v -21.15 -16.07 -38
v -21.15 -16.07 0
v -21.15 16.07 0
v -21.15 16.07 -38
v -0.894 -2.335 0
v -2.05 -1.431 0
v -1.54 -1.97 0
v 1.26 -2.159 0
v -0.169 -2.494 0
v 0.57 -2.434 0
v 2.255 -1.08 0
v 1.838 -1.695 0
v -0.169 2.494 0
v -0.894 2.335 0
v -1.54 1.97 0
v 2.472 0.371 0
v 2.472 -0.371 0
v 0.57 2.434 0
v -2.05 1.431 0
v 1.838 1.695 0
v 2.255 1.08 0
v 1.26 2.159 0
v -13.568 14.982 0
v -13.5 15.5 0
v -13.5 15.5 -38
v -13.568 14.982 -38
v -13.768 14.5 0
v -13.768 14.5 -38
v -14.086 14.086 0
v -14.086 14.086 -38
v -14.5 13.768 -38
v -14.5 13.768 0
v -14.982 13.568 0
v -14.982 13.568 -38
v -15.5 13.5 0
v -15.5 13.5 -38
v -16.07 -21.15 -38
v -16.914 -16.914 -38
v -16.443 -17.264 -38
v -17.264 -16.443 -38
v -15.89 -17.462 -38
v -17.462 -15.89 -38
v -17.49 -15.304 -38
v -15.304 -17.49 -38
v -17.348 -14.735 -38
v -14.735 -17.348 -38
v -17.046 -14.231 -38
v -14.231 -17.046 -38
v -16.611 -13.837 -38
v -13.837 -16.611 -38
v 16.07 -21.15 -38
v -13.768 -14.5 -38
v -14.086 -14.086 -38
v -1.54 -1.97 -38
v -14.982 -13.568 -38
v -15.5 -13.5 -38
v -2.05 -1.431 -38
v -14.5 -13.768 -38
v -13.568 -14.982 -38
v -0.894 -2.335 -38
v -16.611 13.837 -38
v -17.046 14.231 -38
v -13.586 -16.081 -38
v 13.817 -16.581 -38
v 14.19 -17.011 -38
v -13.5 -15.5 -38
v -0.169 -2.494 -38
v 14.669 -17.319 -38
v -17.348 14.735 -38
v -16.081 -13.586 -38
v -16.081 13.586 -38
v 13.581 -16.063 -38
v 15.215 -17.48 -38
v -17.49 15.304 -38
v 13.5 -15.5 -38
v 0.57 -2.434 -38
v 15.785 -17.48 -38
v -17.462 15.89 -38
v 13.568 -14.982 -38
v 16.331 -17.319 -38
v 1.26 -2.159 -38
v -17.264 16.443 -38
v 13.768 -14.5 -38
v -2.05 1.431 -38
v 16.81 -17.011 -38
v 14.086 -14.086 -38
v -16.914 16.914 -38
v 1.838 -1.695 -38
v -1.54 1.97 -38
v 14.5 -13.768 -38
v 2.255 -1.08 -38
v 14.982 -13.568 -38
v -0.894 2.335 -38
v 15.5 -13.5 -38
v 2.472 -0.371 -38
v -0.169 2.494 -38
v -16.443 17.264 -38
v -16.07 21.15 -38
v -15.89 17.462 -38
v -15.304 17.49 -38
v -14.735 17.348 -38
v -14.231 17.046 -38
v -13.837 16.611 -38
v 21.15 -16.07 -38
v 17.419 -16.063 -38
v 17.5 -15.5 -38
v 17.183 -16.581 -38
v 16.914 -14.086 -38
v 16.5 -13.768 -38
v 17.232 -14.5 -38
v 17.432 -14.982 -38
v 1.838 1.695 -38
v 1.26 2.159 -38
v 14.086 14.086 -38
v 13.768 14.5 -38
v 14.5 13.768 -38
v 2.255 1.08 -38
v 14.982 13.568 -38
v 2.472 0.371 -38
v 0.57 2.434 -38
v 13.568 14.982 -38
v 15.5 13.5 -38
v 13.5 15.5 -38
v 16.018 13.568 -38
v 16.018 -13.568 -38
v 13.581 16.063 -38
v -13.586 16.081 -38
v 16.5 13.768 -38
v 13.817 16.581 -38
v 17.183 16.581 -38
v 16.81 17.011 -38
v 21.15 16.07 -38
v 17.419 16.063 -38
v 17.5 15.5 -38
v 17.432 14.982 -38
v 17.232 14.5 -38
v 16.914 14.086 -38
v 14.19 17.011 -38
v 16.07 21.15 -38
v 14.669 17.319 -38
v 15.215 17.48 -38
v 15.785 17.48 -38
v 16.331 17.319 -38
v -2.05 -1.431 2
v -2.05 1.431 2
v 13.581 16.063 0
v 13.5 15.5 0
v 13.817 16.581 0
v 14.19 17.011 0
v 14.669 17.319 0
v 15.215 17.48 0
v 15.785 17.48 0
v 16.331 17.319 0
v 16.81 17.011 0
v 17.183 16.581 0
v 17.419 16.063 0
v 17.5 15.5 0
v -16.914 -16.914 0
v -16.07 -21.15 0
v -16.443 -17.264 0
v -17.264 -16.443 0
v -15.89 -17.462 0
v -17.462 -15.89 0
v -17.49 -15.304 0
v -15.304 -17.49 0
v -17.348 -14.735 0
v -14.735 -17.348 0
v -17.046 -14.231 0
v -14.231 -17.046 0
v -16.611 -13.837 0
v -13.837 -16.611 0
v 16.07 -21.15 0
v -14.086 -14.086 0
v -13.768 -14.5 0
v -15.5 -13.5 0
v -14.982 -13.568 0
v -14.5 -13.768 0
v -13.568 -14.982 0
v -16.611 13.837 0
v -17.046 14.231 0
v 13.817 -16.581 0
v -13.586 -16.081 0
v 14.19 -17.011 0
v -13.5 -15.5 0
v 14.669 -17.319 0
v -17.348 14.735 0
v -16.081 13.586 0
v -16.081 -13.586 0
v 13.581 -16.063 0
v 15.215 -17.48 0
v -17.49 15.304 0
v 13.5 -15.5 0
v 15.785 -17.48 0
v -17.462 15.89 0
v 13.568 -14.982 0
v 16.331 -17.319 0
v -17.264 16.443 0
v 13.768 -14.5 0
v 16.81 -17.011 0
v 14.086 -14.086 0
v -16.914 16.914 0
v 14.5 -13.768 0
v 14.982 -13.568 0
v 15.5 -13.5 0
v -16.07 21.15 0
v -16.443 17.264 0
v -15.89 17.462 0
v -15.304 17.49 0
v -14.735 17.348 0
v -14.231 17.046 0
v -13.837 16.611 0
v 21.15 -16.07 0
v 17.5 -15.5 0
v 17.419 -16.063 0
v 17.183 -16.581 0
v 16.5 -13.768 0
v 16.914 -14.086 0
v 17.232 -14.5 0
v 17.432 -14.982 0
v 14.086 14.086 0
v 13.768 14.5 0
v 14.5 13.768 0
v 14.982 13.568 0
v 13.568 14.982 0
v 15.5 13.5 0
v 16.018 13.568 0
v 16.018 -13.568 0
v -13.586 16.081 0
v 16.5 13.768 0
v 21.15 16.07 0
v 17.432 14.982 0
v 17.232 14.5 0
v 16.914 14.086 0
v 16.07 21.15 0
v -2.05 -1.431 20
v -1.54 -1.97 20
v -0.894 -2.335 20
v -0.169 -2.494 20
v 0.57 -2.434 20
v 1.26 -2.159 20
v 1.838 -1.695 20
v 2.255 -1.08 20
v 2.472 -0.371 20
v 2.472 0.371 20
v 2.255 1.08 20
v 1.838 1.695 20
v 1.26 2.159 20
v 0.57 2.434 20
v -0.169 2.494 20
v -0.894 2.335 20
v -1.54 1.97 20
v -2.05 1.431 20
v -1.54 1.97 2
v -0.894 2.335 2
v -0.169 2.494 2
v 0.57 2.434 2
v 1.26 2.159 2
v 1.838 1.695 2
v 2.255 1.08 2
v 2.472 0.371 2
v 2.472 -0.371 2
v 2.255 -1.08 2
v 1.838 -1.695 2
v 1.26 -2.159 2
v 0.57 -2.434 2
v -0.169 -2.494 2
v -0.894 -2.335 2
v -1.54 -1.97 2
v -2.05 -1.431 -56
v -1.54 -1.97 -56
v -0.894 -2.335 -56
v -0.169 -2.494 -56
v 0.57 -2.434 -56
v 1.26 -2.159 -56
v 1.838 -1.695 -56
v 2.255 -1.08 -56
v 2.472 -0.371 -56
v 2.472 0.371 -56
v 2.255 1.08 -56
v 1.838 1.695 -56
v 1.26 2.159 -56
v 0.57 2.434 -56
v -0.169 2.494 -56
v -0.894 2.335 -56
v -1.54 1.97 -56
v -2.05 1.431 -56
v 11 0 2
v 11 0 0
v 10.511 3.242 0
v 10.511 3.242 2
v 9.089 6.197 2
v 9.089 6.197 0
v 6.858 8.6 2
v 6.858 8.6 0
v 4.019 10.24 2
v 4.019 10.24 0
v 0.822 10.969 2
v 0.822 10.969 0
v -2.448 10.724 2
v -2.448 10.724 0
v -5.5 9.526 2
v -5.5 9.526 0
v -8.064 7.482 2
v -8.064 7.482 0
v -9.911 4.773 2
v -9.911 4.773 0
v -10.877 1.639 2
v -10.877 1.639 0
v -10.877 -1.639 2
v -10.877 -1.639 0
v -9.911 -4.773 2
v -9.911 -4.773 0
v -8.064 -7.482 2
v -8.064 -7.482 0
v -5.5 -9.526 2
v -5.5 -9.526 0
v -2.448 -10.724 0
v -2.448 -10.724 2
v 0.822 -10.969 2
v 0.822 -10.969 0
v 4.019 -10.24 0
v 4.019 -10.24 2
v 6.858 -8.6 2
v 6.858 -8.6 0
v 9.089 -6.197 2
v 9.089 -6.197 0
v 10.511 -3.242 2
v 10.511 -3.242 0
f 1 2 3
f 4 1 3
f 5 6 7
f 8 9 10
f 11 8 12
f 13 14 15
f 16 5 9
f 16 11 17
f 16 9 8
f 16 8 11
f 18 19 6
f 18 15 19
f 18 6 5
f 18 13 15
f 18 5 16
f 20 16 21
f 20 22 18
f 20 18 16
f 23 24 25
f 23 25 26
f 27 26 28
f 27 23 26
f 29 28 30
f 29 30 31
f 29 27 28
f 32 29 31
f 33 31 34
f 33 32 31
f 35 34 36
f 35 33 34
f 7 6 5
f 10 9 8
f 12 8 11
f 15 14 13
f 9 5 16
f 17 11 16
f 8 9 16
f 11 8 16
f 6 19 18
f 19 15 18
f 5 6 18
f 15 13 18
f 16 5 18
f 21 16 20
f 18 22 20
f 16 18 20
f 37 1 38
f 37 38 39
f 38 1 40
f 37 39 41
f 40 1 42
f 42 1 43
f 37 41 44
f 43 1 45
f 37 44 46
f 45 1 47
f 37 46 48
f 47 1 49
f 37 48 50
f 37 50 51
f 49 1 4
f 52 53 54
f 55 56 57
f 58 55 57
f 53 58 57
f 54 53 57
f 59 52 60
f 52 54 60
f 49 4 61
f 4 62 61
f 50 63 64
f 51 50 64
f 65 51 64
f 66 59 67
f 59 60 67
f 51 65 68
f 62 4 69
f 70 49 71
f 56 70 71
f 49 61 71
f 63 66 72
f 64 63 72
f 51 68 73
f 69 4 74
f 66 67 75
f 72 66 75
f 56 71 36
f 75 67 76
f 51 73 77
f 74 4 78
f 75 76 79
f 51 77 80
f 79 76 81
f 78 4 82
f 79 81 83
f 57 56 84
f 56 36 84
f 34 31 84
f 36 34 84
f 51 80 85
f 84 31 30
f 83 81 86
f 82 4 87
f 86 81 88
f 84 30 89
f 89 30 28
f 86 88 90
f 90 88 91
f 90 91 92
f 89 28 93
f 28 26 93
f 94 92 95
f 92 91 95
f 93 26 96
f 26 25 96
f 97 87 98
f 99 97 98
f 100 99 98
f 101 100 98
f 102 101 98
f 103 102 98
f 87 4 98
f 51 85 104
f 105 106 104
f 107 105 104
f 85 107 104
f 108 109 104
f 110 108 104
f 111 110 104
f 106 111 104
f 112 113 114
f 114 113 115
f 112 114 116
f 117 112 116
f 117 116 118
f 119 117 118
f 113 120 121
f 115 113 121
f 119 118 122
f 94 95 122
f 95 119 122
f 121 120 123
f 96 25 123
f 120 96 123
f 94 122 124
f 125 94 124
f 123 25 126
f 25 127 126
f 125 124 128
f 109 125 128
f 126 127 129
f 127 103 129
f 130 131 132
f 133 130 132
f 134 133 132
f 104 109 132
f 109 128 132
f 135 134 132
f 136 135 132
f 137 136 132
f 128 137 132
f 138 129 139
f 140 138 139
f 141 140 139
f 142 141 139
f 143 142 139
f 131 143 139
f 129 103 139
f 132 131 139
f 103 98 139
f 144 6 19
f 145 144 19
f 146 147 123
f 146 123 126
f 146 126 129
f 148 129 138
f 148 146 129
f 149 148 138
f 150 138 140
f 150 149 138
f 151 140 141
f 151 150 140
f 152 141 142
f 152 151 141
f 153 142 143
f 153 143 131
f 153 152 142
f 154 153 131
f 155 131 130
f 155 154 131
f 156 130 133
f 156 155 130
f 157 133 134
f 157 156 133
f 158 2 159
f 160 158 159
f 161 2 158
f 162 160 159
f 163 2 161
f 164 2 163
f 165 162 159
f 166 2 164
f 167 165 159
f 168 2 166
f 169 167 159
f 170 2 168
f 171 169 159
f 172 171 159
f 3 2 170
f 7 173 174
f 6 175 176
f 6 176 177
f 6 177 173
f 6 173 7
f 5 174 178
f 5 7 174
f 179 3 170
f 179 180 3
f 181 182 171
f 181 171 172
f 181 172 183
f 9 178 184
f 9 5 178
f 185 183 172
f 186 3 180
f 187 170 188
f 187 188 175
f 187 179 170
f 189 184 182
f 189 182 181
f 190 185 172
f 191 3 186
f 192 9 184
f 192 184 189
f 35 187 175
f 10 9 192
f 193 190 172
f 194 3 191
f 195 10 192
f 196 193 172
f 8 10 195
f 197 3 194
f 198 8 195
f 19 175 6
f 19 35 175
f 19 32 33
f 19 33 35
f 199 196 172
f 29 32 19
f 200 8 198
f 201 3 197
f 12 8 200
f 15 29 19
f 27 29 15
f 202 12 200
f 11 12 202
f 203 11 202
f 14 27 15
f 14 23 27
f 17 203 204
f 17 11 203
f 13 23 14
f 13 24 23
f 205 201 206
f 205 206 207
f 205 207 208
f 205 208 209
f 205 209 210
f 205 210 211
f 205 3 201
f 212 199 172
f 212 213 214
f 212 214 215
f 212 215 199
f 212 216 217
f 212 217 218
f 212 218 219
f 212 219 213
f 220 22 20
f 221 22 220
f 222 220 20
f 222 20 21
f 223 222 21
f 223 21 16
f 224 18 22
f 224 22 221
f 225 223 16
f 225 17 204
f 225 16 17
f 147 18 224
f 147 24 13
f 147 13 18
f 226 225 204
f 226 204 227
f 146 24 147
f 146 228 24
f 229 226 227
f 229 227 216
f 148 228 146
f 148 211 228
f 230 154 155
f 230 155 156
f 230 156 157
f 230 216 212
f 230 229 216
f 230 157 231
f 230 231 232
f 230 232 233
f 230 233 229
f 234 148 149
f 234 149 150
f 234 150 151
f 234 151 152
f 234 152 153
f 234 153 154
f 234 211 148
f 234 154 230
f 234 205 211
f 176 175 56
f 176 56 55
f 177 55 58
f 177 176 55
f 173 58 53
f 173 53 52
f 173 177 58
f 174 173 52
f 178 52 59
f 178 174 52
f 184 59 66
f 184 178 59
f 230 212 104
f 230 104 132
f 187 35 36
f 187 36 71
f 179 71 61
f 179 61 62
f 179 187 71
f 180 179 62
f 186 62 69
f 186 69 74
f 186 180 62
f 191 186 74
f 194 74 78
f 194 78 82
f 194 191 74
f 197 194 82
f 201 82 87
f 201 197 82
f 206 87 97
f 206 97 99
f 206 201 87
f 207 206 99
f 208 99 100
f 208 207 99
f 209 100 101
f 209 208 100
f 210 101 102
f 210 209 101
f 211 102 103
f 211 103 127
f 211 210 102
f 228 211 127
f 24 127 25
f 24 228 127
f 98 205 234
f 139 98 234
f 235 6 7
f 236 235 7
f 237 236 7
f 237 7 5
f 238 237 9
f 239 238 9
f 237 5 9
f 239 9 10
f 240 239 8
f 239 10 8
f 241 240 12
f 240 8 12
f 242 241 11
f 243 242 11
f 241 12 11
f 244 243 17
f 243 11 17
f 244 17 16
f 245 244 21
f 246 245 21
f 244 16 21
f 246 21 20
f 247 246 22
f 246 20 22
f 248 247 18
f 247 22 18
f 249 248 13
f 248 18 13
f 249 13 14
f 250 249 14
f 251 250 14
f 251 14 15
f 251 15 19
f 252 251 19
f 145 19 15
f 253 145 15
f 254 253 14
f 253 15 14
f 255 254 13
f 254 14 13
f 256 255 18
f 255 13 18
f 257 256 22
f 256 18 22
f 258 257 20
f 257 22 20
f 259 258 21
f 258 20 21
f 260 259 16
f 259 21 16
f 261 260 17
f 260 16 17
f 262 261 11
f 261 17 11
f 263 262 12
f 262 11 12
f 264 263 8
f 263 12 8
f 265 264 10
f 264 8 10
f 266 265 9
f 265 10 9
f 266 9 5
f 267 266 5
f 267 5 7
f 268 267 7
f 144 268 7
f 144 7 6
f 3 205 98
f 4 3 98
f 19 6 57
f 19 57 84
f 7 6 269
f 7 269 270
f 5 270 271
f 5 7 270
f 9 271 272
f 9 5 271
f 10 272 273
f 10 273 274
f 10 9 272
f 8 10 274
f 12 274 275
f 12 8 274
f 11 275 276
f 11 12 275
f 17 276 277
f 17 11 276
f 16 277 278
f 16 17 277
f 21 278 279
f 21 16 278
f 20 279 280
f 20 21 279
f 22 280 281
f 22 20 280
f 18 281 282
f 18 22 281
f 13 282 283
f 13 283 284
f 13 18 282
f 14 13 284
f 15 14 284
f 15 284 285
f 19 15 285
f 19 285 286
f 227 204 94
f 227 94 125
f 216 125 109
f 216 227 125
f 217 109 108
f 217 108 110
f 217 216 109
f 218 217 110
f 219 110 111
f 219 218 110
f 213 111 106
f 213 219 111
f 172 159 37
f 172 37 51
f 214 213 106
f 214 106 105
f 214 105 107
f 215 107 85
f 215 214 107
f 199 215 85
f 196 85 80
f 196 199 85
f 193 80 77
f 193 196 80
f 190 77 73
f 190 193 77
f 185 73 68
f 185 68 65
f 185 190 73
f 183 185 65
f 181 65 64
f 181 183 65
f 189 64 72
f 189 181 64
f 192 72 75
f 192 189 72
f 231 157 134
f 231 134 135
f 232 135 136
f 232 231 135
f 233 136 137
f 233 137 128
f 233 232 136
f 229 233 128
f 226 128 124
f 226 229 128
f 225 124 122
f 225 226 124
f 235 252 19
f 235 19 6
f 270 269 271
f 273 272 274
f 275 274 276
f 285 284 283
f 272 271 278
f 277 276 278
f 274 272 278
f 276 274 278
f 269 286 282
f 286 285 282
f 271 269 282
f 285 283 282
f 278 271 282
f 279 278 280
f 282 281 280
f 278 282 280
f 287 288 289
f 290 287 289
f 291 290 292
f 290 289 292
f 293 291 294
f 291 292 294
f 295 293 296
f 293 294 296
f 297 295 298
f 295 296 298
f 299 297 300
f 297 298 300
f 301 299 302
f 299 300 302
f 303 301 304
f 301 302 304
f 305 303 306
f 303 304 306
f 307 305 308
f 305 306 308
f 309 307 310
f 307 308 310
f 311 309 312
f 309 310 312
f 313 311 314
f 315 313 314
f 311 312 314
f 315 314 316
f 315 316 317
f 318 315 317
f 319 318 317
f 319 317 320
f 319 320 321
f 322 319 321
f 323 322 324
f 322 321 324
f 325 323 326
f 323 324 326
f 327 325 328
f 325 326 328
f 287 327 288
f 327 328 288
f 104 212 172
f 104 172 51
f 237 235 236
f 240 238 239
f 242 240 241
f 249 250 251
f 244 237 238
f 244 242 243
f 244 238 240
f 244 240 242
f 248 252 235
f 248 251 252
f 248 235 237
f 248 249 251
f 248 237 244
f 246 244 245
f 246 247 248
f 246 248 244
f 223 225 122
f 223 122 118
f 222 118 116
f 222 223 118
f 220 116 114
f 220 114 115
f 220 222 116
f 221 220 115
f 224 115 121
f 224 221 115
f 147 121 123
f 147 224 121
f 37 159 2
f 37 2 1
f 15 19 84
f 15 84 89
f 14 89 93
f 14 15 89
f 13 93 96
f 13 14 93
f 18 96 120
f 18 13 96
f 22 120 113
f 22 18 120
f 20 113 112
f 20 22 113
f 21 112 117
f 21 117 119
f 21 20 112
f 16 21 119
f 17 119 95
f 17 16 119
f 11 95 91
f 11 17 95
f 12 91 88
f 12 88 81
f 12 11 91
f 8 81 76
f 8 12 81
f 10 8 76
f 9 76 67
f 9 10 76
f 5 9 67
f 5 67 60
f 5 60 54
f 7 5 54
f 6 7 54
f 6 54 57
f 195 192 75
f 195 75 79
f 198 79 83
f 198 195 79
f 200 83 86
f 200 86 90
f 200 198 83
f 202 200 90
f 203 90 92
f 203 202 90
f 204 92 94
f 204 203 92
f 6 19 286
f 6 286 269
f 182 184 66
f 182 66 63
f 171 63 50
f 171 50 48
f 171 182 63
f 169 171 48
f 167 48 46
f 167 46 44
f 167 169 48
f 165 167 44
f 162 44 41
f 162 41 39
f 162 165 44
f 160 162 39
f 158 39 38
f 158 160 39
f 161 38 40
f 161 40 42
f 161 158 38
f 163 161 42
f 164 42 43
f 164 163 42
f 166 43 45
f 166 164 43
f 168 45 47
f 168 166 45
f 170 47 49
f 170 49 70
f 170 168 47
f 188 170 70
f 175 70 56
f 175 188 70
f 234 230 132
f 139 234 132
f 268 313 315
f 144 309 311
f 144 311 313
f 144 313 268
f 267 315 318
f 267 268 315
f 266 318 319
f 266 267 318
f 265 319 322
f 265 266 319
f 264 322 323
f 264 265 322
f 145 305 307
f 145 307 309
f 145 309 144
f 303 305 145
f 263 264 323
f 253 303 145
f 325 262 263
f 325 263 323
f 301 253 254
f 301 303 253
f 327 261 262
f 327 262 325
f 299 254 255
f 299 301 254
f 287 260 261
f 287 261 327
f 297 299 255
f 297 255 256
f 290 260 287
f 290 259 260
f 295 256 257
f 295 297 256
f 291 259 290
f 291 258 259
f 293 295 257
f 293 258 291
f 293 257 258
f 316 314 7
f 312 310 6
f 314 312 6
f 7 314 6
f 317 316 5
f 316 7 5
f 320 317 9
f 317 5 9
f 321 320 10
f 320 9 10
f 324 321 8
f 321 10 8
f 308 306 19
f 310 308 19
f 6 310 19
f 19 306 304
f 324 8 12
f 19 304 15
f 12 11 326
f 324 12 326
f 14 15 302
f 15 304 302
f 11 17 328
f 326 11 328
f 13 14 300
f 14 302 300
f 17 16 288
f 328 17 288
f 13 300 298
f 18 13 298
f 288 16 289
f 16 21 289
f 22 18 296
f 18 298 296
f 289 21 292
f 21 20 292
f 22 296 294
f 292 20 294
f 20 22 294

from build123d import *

# Parameters (mm, degrees)
F1_DEPTH = 20
F0_W     = 42.3
F0_H     = 42.3
F0_R     = 11
F2_DEPTH = 38
F3_DEPTH = 2
F4_DEPTH = 56
F5_SIZE  = 5.08


with BuildPart() as f1:
    # F0 (on Top) → F1 (new body)
    with BuildSketch(Plane.XY):
        with BuildLine():
            Line((-2.05, 1.4309088021), (-2.05, -1.4309088021))
            ThreePointArc((-2.05, -1.4309088021), (2.5, 0), (-2.05, 1.4309088021))
        make_face()
    extrude(amount=F1_DEPTH)


with BuildPart() as f2:
    # F0 (on Top) → F2 (new body)
    with BuildSketch(Plane.XY):
        Rectangle(F0_W, F0_H)
        with BuildLine():
            ThreePointArc((-15.5, 13.5), (-16.9142135624, 16.9142135624), (-13.5, 15.5))
            Line((-13.5, 15.5), (13.5, 15.5))
            ThreePointArc((13.5, 15.5), (15.5, 17.5), (17.5, 15.5))
            ThreePointArc((17.5, 15.5), (16.9142135624, 14.0857864376), (15.5, 13.5))
            Line((15.5, 13.5), (15.5, -13.5))
            ThreePointArc((15.5, -13.5), (16.9142135624, -14.0857864376), (17.5, -15.5))
            ThreePointArc((17.5, -15.5), (15.5, -17.5), (13.5, -15.5))
            Line((13.5, -15.5), (-13.5, -15.5))
            ThreePointArc((-13.5, -15.5), (-16.9142135624, -16.9142135624), (-15.5, -13.5))
            Line((-15.5, -13.5), (-15.5, 13.5))
        make_face(mode=Mode.SUBTRACT)
        with BuildLine():
            Line((13.5, 15.5), (-13.5, 15.5))
            ThreePointArc((-13.5, 15.5), (-14.0857864376, 14.0857864376), (-15.5, 13.5))
            Line((-15.5, 13.5), (-15.5, -13.5))
            ThreePointArc((-15.5, -13.5), (-14.0857864376, -14.0857864376), (-13.5, -15.5))
            Line((-13.5, -15.5), (13.5, -15.5))
            ThreePointArc((13.5, -15.5), (14.0857864376, -14.0857864376), (15.5, -13.5))
            Line((15.5, -13.5), (15.5, 13.5))
            ThreePointArc((15.5, 13.5), (14.0857864376, 14.0857864376), (13.5, 15.5))
        make_face()
        Circle(F0_R, mode=Mode.SUBTRACT)
        Circle(F0_R)
        with BuildLine():
            ThreePointArc((-2.05, 1.4309088021), (2.5, 0), (-2.05, -1.4309088021))
            Line((-2.05, -1.4309088021), (-2.05, 1.4309088021))
        make_face(mode=Mode.SUBTRACT)
    extrude(amount=-F2_DEPTH)

    # F5
    f5_edges = [f2.edges().sort_by_distance(p)[0] for p in [
        (-21.15, 21.15, -19),
        (21.15, 21.15, -19),
        (21.15, -21.15, -19),
        (-21.15, -21.15, -19),
    ]]
    chamfer(f5_edges, length=F5_SIZE)


with BuildPart() as f3:
    # F0 (on Top) → F3 (new body)
    with BuildSketch(Plane.XY):
        Circle(F0_R)
        with BuildLine():
            ThreePointArc((-2.05, 1.4309088021), (2.5, 0), (-2.05, -1.4309088021))
            Line((-2.05, -1.4309088021), (-2.05, 1.4309088021))
        make_face(mode=Mode.SUBTRACT)
    extrude(amount=F3_DEPTH)


with BuildPart() as f4:
    # F0 (on Top) → F4 (new body)
    with BuildSketch(Plane.XY):
        with BuildLine():
            Line((-2.05, 1.4309088021), (-2.05, -1.4309088021))
            ThreePointArc((-2.05, -1.4309088021), (2.5, 0), (-2.05, 1.4309088021))
        make_face()
    extrude(amount=-F4_DEPTH)


solid = Compound([f1.part, f2.part, f3.part, f4.part])
